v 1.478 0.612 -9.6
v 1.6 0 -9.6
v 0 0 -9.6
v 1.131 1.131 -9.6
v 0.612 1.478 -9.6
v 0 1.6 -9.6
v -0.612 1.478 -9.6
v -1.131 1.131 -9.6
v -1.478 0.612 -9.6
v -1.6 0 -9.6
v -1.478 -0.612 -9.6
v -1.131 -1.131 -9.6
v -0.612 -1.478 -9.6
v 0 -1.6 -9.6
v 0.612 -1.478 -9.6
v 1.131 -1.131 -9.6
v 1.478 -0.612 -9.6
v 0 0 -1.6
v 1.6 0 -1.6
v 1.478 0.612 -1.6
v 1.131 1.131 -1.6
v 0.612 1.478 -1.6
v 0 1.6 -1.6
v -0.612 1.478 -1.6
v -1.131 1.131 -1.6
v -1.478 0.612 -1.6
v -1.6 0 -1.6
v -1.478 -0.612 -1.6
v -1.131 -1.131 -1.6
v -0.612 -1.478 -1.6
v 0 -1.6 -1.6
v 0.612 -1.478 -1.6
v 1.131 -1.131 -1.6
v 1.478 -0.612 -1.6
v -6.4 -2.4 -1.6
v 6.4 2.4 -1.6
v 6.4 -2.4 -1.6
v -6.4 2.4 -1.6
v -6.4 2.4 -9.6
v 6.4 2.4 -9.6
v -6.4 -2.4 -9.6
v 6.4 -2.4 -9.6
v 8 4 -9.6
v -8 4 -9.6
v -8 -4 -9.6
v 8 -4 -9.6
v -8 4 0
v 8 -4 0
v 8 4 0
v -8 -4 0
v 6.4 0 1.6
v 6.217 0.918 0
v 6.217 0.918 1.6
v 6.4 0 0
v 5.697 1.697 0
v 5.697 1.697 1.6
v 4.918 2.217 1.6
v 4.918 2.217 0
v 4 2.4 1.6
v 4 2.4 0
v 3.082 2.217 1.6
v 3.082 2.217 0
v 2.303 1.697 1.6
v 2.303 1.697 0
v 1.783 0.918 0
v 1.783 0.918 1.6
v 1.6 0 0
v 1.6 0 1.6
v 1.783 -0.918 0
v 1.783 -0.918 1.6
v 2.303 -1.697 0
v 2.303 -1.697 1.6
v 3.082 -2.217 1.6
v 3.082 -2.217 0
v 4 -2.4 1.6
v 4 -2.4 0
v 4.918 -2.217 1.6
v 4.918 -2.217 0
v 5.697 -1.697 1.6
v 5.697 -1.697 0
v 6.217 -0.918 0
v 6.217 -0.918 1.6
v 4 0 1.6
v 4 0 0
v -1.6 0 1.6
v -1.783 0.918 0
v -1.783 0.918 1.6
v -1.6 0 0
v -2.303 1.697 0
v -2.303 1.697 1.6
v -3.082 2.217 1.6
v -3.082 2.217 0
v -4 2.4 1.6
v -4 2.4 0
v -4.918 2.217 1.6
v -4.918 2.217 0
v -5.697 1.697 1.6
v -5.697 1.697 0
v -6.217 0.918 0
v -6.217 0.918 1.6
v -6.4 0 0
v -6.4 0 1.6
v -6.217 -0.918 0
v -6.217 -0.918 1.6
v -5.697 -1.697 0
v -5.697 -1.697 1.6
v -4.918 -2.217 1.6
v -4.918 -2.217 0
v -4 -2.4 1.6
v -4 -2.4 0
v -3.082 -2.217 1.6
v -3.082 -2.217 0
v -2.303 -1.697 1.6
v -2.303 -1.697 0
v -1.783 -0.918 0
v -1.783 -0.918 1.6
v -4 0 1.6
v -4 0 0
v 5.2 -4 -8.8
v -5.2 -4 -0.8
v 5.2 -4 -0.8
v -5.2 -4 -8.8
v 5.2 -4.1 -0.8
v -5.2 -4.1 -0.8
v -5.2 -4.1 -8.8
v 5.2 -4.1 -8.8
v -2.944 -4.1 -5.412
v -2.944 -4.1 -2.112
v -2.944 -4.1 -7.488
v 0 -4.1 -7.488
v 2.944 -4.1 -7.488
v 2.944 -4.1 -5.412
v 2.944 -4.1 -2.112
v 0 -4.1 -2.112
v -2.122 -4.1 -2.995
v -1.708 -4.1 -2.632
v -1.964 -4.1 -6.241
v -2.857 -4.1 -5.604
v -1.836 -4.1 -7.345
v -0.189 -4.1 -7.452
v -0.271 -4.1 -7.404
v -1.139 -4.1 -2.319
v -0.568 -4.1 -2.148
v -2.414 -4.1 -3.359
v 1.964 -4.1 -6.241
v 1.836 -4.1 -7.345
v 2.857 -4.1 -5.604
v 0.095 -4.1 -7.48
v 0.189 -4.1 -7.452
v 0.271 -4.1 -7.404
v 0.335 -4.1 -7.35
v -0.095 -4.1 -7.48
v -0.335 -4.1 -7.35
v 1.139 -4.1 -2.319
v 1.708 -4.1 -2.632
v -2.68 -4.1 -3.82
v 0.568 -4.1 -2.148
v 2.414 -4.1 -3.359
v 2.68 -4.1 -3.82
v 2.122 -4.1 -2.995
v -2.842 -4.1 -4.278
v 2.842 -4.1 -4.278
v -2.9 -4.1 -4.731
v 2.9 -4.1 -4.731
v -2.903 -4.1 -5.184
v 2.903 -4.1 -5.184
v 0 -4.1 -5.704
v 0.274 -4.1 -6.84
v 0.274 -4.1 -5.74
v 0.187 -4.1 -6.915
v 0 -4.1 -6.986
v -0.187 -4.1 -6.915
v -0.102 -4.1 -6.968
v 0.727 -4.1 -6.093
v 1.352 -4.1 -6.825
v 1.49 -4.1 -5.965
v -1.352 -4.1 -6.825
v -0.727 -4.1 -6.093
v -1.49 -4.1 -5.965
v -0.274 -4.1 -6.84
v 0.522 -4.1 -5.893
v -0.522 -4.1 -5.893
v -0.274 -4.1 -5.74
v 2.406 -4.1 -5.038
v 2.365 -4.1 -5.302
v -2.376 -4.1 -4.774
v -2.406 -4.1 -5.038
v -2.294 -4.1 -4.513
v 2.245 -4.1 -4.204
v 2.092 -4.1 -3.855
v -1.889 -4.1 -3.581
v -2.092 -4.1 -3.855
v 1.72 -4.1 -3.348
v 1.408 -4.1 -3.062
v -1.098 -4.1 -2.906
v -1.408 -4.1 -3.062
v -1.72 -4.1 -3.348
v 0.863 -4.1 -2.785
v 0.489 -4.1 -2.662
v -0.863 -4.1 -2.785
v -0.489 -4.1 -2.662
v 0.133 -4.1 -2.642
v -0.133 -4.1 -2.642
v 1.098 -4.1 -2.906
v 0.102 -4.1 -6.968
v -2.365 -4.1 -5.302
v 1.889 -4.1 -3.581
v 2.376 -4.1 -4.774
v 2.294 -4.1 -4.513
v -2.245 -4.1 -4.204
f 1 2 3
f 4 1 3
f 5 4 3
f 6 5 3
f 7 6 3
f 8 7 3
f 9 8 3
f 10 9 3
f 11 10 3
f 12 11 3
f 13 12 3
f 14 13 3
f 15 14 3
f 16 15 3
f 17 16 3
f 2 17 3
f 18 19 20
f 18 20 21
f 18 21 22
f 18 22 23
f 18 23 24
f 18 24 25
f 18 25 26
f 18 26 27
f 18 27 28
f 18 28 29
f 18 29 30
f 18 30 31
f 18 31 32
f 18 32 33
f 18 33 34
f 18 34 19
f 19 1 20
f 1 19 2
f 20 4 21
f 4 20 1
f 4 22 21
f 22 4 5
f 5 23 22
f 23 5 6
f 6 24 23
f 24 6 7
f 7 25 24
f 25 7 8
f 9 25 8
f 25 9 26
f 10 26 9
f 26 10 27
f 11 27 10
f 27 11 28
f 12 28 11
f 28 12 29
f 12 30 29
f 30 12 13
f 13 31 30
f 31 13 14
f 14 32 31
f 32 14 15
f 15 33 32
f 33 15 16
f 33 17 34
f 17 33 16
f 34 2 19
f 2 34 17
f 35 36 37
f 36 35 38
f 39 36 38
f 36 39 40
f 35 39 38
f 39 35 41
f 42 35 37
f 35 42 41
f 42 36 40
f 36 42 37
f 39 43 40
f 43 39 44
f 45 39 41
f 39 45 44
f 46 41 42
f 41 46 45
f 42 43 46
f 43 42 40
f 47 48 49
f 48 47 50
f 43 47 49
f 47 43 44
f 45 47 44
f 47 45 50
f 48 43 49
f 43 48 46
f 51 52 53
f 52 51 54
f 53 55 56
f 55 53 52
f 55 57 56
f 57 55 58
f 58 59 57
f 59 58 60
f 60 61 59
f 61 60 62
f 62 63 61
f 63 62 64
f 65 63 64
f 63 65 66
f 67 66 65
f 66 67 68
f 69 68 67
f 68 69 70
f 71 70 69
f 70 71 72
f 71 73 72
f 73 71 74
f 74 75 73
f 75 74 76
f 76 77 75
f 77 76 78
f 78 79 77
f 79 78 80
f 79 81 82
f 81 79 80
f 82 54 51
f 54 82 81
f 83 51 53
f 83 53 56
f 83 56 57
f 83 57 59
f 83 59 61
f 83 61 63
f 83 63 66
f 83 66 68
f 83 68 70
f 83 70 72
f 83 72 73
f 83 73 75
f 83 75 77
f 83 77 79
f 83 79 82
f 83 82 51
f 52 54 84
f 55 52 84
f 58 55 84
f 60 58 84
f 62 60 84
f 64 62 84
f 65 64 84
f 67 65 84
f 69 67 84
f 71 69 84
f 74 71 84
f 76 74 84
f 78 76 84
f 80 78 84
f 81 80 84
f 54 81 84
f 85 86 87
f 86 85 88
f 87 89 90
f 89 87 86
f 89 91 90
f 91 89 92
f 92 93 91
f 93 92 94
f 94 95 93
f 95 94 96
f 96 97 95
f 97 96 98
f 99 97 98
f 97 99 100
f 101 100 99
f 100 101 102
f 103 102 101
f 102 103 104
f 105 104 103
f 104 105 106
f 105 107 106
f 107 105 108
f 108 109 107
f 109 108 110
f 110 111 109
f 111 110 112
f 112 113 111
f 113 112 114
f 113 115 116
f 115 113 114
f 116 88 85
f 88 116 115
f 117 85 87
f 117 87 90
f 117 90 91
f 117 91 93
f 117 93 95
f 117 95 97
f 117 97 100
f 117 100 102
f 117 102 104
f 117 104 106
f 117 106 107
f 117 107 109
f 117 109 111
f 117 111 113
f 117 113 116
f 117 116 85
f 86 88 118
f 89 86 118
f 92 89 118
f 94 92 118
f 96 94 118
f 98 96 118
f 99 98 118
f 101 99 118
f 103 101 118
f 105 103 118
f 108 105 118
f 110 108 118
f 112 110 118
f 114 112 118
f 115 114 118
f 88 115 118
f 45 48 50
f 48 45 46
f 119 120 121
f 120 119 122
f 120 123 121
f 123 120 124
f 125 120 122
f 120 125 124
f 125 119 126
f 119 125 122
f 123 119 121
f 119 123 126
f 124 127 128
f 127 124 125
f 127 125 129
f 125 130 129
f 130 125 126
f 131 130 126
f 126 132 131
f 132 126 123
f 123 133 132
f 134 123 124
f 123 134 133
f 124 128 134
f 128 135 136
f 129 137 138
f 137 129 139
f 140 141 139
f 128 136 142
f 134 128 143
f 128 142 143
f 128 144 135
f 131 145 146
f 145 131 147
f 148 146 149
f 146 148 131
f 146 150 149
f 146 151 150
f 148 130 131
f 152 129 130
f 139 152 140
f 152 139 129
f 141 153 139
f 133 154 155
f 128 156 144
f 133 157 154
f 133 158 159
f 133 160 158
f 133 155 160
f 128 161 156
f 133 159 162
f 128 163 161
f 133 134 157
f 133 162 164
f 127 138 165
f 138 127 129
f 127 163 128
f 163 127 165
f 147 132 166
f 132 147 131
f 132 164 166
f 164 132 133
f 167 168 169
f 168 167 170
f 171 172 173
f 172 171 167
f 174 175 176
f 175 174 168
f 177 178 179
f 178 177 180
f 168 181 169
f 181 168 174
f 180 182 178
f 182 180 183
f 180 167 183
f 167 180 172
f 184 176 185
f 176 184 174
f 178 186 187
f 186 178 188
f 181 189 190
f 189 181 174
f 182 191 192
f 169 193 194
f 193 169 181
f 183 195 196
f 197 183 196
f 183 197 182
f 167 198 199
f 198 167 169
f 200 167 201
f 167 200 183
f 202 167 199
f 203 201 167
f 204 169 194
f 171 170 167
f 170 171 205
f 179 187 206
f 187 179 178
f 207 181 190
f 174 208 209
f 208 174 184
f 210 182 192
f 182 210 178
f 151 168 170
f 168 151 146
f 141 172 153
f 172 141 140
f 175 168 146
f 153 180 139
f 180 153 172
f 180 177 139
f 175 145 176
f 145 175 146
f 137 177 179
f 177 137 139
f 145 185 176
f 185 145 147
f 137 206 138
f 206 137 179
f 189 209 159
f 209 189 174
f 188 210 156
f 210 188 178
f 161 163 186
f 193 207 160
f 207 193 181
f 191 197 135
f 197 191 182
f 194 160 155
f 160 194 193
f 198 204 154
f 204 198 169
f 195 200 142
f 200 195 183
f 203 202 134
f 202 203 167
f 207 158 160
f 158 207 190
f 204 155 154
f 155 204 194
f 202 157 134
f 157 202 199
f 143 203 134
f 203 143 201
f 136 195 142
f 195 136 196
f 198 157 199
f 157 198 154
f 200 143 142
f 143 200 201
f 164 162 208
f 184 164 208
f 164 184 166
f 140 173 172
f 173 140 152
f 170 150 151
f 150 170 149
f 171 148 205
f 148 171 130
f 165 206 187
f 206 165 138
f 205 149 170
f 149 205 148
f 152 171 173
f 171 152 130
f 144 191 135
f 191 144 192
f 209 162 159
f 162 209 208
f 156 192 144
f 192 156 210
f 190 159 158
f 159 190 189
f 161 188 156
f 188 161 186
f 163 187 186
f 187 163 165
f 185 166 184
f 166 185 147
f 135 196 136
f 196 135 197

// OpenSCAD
// file: ../p/4-4edge.scad
use <../lib.scad>
function ldraw_lib__4_4edge() = [
// 0 Circle 1.0
// 0 Name: 4-4edge.dat
// 0 Author: James Jessiman
// 0 !LDRAW_ORG Primitive UPDATE 2017-01
// 0 !LICENSE Licensed under CC BY 2.0 and CC BY 4.0 : see CAreadme.txt
// 
// 0 BFC CERTIFY CCW
  [0,"BFC","CERTIFY"],
  [0,"BFC","CCW"],
// 
// 0 !HISTORY 1998-12-15 [PTadmin] Official Update 1998-10
// 0 !HISTORY 2005-12-28 [PTadmin] Official Update 2005-01
// 0 !HISTORY 2007-06-24 [PTadmin] Header formatted for Contributor Agreement
// 0 !HISTORY 2008-07-01 [PTadmin] Official Update 2008-01
// 0 !HISTORY 2017-01-15 [Steffen] BFCed
// 0 !HISTORY 2017-12-30 [PTadmin] Official Update 2017-01
// 
// 
// 2 24 1 0 0 0.9239 0 0.3827
  [2,24,1,0,0,0.9239,0,0.3827],
// 2 24 0.9239 0 0.3827 0.7071 0 0.7071
  [2,24,0.9239,0,0.3827,0.7071,0,0.7071],
// 2 24 0.7071 0 0.7071 0.3827 0 0.9239
  [2,24,0.7071,0,0.7071,0.3827,0,0.9239],
// 2 24 0.3827 0 0.9239 0 0 1
  [2,24,0.3827,0,0.9239,0,0,1],
// 2 24 0 0 1 -0.3827 0 0.9239
  [2,24,0,0,1,-0.3827,0,0.9239],
// 2 24 -0.3827 0 0.9239 -0.7071 0 0.7071
  [2,24,-0.3827,0,0.9239,-0.7071,0,0.7071],
// 2 24 -0.7071 0 0.7071 -0.9239 0 0.3827
  [2,24,-0.7071,0,0.7071,-0.9239,0,0.3827],
// 2 24 -0.9239 0 0.3827 -1 0 -0
  [2,24,-0.9239,0,0.3827,-1,0,-0],
// 2 24 -1 0 -0 -0.9239 0 -0.3827
  [2,24,-1,0,-0,-0.9239,0,-0.3827],
// 2 24 -0.9239 0 -0.3827 -0.7071 0 -0.7071
  [2,24,-0.9239,0,-0.3827,-0.7071,0,-0.7071],
// 2 24 -0.7071 0 -0.7071 -0.3827 0 -0.9239
  [2,24,-0.7071,0,-0.7071,-0.3827,0,-0.9239],
// 2 24 -0.3827 0 -0.9239 0 0 -1
  [2,24,-0.3827,0,-0.9239,0,0,-1],
// 2 24 0 0 -1 0.3827 0 -0.9239
  [2,24,0,0,-1,0.3827,0,-0.9239],
// 2 24 0.3827 0 -0.9239 0.7071 0 -0.7071
  [2,24,0.3827,0,-0.9239,0.7071,0,-0.7071],
// 2 24 0.7071 0 -0.7071 0.9239 0 -0.3827
  [2,24,0.7071,0,-0.7071,0.9239,0,-0.3827],
// 2 24 0.9239 0 -0.3827 1 0 0
  [2,24,0.9239,0,-0.3827,1,0,0],
];
module ldraw_lib__4_4edge(step=0, col=false, unit=2/5, alt=false, line=0.2, solid=!$preview)
    makepoly(ldraw_lib__4_4edge(), step=step, col=col, unit=unit, alt=alt, line=line, solid=solid);
ldraw_lib__4_4edge(line=0.2);
// file: ../p/4-4disc.scad
use <../lib.scad>
function ldraw_lib__4_4disc() = [
// 0 Disc 1.0
// 0 Name: 4-4disc.dat
// 0 Author: James Jessiman
// 0 !LDRAW_ORG Primitive UPDATE 2002-02
// 0 !LICENSE Licensed under CC BY 2.0 and CC BY 4.0 : see CAreadme.txt
// 
// 0 BFC CERTIFY CCW
  [0,"BFC","CERTIFY"],
  [0,"BFC","CCW"],
// 
// 0 !HISTORY 1998-12-15 [PTadmin] Official Update 1998-10
// 0 !HISTORY 2002-03-23 [sbliss] Added BFC statement
// 0 !HISTORY 2002-04-25 [PTadmin] Official Update 2002-02
// 0 !HISTORY 2007-06-24 [PTadmin] Header formatted for Contributor Agreement
// 0 !HISTORY 2008-07-01 [PTadmin] Official Update 2008-01
// 
// 
// 3 16 0 0 0 1 0 0 0.9239 0 0.3827
  [3,16,0,0,0,1,0,0,0.9239,0,0.3827],
// 3 16 0 0 0 0.9239 0 0.3827 0.7071 0 0.7071
  [3,16,0,0,0,0.9239,0,0.3827,0.7071,0,0.7071],
// 3 16 0 0 0 0.7071 0 0.7071 0.3827 0 0.9239
  [3,16,0,0,0,0.7071,0,0.7071,0.3827,0,0.9239],
// 3 16 0 0 0 0.3827 0 0.9239 0 0 1
  [3,16,0,0,0,0.3827,0,0.9239,0,0,1],
// 3 16 0 0 0 0 0 1 -0.3827 0 0.9239
  [3,16,0,0,0,0,0,1,-0.3827,0,0.9239],
// 3 16 0 0 0 -0.3827 0 0.9239 -0.7071 0 0.7071
  [3,16,0,0,0,-0.3827,0,0.9239,-0.7071,0,0.7071],
// 3 16 0 0 0 -0.7071 0 0.7071 -0.9239 0 0.3827
  [3,16,0,0,0,-0.7071,0,0.7071,-0.9239,0,0.3827],
// 3 16 0 0 0 -0.9239 0 0.3827 -1 0 -0
  [3,16,0,0,0,-0.9239,0,0.3827,-1,0,-0],
// 3 16 0 0 0 -1 0 -0 -0.9239 0 -0.3827
  [3,16,0,0,0,-1,0,-0,-0.9239,0,-0.3827],
// 3 16 0 0 0 -0.9239 0 -0.3827 -0.7071 0 -0.7071
  [3,16,0,0,0,-0.9239,0,-0.3827,-0.7071,0,-0.7071],
// 3 16 0 0 0 -0.7071 0 -0.7071 -0.3827 0 -0.9239
  [3,16,0,0,0,-0.7071,0,-0.7071,-0.3827,0,-0.9239],
// 3 16 0 0 0 -0.3827 0 -0.9239 0 0 -1
  [3,16,0,0,0,-0.3827,0,-0.9239,0,0,-1],
// 3 16 0 0 0 0 0 -1 0.3827 0 -0.9239
  [3,16,0,0,0,0,0,-1,0.3827,0,-0.9239],
// 3 16 0 0 0 0.3827 0 -0.9239 0.7071 0 -0.7071
  [3,16,0,0,0,0.3827,0,-0.9239,0.7071,0,-0.7071],
// 3 16 0 0 0 0.7071 0 -0.7071 0.9239 0 -0.3827
  [3,16,0,0,0,0.7071,0,-0.7071,0.9239,0,-0.3827],
// 3 16 0 0 0 0.9239 0 -0.3827 1 0 0
  [3,16,0,0,0,0.9239,0,-0.3827,1,0,0],
// 0
];
module ldraw_lib__4_4disc(step=0, col=false, unit=2/5, alt=false, line=0.2, solid=!$preview)
    makepoly(ldraw_lib__4_4disc(), step=step, col=col, unit=unit, alt=alt, line=line, solid=solid);
ldraw_lib__4_4disc(line=0.2);
// file: ../p/4-4cyli.scad
use <../lib.scad>
$fa=1; $fs=0.2;
function ldraw_lib__4_4cyli(realsolid=false) = [
// 0 Cylinder 1.0
// 0 Name: 4-4cyli.dat
// 0 Author: James Jessiman
// 0 !LDRAW_ORG Primitive UPDATE 2005-01
// 0 !LICENSE Licensed under CC BY 2.0 and CC BY 4.0 : see CAreadme.txt
// 
// 0 BFC CERTIFY CCW
  [0,"BFC","CERTIFY"],
  [0,"BFC","CCW"],
// 
// 0 !HISTORY 1998-12-15 [PTadmin] Official Update 1998-10
// 0 !HISTORY 2002-03-23 [sbliss] Added BFC statement; merged headers from files in distributions LDraw 0.27 and Complete.
// 0 !HISTORY 2002-04-25 [PTadmin] Official Update 2002-02
// 0 !HISTORY 2004-12-14 [guyvivan] BFC CCW
// 0 !HISTORY 2005-12-28 [PTadmin] Official Update 2005-01
// 0 !HISTORY 2007-06-24 [PTadmin] Header formatted for Contributor Agreement
// 0 !HISTORY 2008-07-01 [PTadmin] Official Update 2008-01
// 
// 
// 4 16 1 1 0 0.9239 1 0.3827 0.9239 0 0.3827 1 0 0
  [4,16,1,1,0,0.9239,1,0.3827,0.9239,0,0.3827,1,0,0],
// 5 24 1 0 0 1 1 0 0.9239 0 0.3827 0.9239 0 -0.3827
  [5,24,1,0,0,1,1,0,0.9239,0,0.3827,0.9239,0,-0.3827],
// 4 16 0.9239 1 0.3827 0.7071 1 0.7071 0.7071 0 0.7071 0.9239 0 0.3827
  [4,16,0.9239,1,0.3827,0.7071,1,0.7071,0.7071,0,0.7071,0.9239,0,0.3827],
// 5 24 0.9239 0 0.3827 0.9239 1 0.3827 0.7071 0 0.7071 1 0 0
  [5,24,0.9239,0,0.3827,0.9239,1,0.3827,0.7071,0,0.7071,1,0,0],
// 4 16 0.7071 1 0.7071 0.3827 1 0.9239 0.3827 0 0.9239 0.7071 0 0.7071
  [4,16,0.7071,1,0.7071,0.3827,1,0.9239,0.3827,0,0.9239,0.7071,0,0.7071],
// 5 24 0.7071 0 0.7071 0.7071 1 0.7071 0.3827 0 0.9239 0.9239 0 0.3827
  [5,24,0.7071,0,0.7071,0.7071,1,0.7071,0.3827,0,0.9239,0.9239,0,0.3827],
// 4 16 0.3827 1 0.9239 0 1 1 0 0 1 0.3827 0 0.9239
  [4,16,0.3827,1,0.9239,0,1,1,0,0,1,0.3827,0,0.9239],
// 5 24 0.3827 0 0.9239 0.3827 1 0.9239 0 0 1 0.7071 0 0.7071
  [5,24,0.3827,0,0.9239,0.3827,1,0.9239,0,0,1,0.7071,0,0.7071],
// 4 16 0 1 1 -0.3827 1 0.9239 -0.3827 0 0.9239 0 0 1
  [4,16,0,1,1,-0.3827,1,0.9239,-0.3827,0,0.9239,0,0,1],
// 5 24 0 0 1 0 1 1 -0.3827 0 0.9239 0.3827 0 0.9239
  [5,24,0,0,1,0,1,1,-0.3827,0,0.9239,0.3827,0,0.9239],
// 4 16 -0.3827 1 0.9239 -0.7071 1 0.7071 -0.7071 0 0.7071 -0.3827 0 0.9239
  [4,16,-0.3827,1,0.9239,-0.7071,1,0.7071,-0.7071,0,0.7071,-0.3827,0,0.9239],
// 5 24 -0.3827 0 0.9239 -0.3827 1 0.9239 -0.7071 0 0.7071 0 0 1
  [5,24,-0.3827,0,0.9239,-0.3827,1,0.9239,-0.7071,0,0.7071,0,0,1],
// 4 16 -0.7071 1 0.7071 -0.9239 1 0.3827 -0.9239 0 0.3827 -0.7071 0 0.7071
  [4,16,-0.7071,1,0.7071,-0.9239,1,0.3827,-0.9239,0,0.3827,-0.7071,0,0.7071],
// 5 24 -0.7071 0 0.7071 -0.7071 1 0.7071 -0.9239 0 0.3827 -0.3827 0 0.9239
  [5,24,-0.7071,0,0.7071,-0.7071,1,0.7071,-0.9239,0,0.3827,-0.3827,0,0.9239],
// 4 16 -0.9239 1 0.3827 -1 1 0 -1 0 0 -0.9239 0 0.3827
  [4,16,-0.9239,1,0.3827,-1,1,0,-1,0,0,-0.9239,0,0.3827],
// 5 24 -0.9239 0 0.3827 -0.9239 1 0.3827 -1 0 0 -0.7071 0 0.7071
  [5,24,-0.9239,0,0.3827,-0.9239,1,0.3827,-1,0,0,-0.7071,0,0.7071],
// 4 16 -1 1 0 -0.9239 1 -0.3827 -0.9239 0 -0.3827 -1 0 0
  [4,16,-1,1,0,-0.9239,1,-0.3827,-0.9239,0,-0.3827,-1,0,0],
// 5 24 -1 0 0 -1 1 0 -0.9239 0 -0.3827 -0.9239 0 0.3827
  [5,24,-1,0,0,-1,1,0,-0.9239,0,-0.3827,-0.9239,0,0.3827],
// 4 16 -0.9239 1 -0.3827 -0.7071 1 -0.7071 -0.7071 0 -0.7071 -0.9239 0 -0.3827
  [4,16,-0.9239,1,-0.3827,-0.7071,1,-0.7071,-0.7071,0,-0.7071,-0.9239,0,-0.3827],
// 5 24 -0.9239 0 -0.3827 -0.9239 1 -0.3827 -0.7071 0 -0.7071 -1 0 0
  [5,24,-0.9239,0,-0.3827,-0.9239,1,-0.3827,-0.7071,0,-0.7071,-1,0,0],
// 4 16 -0.7071 1 -0.7071 -0.3827 1 -0.9239 -0.3827 0 -0.9239 -0.7071 0 -0.7071
  [4,16,-0.7071,1,-0.7071,-0.3827,1,-0.9239,-0.3827,0,-0.9239,-0.7071,0,-0.7071],
// 5 24 -0.7071 0 -0.7071 -0.7071 1 -0.7071 -0.3827 0 -0.9239 -0.9239 0 -0.3827
  [5,24,-0.7071,0,-0.7071,-0.7071,1,-0.7071,-0.3827,0,-0.9239,-0.9239,0,-0.3827],
// 4 16 -0.3827 1 -0.9239 0 1 -1 0 0 -1 -0.3827 0 -0.9239
  [4,16,-0.3827,1,-0.9239,0,1,-1,0,0,-1,-0.3827,0,-0.9239],
// 5 24 -0.3827 0 -0.9239 -0.3827 1 -0.9239 0 0 -1 -0.7071 0 -0.7071
  [5,24,-0.3827,0,-0.9239,-0.3827,1,-0.9239,0,0,-1,-0.7071,0,-0.7071],
// 4 16 0 1 -1 0.3827 1 -0.9239 0.3827 0 -0.9239 0 0 -1
  [4,16,0,1,-1,0.3827,1,-0.9239,0.3827,0,-0.9239,0,0,-1],
// 5 24 0 0 -1 0 1 -1 0.3827 0 -0.9239 -0.3827 0 -0.9239
  [5,24,0,0,-1,0,1,-1,0.3827,0,-0.9239,-0.3827,0,-0.9239],
// 4 16 0.3827 1 -0.9239 0.7071 1 -0.7071 0.7071 0 -0.7071 0.3827 0 -0.9239
  [4,16,0.3827,1,-0.9239,0.7071,1,-0.7071,0.7071,0,-0.7071,0.3827,0,-0.9239],
// 5 24 0.3827 0 -0.9239 0.3827 1 -0.9239 0.7071 0 -0.7071 0 0 -1
  [5,24,0.3827,0,-0.9239,0.3827,1,-0.9239,0.7071,0,-0.7071,0,0,-1],
// 4 16 0.7071 1 -0.7071 0.9239 1 -0.3827 0.9239 0 -0.3827 0.7071 0 -0.7071
  [4,16,0.7071,1,-0.7071,0.9239,1,-0.3827,0.9239,0,-0.3827,0.7071,0,-0.7071],
// 5 24 0.7071 0 -0.7071 0.7071 1 -0.7071 0.9239 0 -0.3827 0.3827 0 -0.9239
  [5,24,0.7071,0,-0.7071,0.7071,1,-0.7071,0.9239,0,-0.3827,0.3827,0,-0.9239],
// 4 16 0.9239 1 -0.3827 1 1 0 1 0 0 0.9239 0 -0.3827
  [4,16,0.9239,1,-0.3827,1,1,0,1,0,0,0.9239,0,-0.3827],
// 5 24 0.9239 0 -0.3827 0.9239 1 -0.3827 1 0 0 0.7071 0 -0.7071
  [5,24,0.9239,0,-0.3827,0.9239,1,-0.3827,1,0,0,0.7071,0,-0.7071],
// 0
];
module ldraw_lib__4_4cyli(step=0, col=false, unit=2/5, alt=false, line=0.2, solid=!$preview)
    makepoly(ldraw_lib__4_4cyli(solid), step=step, col=col, unit=unit, alt=alt, line=line, solid=solid);
ldraw_lib__4_4cyli(line=0.2);
// file: ../p/stud3.scad
use <../lib.scad>
use <4-4cyli.scad>
use <4-4disc.scad>
use <4-4edge.scad>
function ldraw_lib__stud3() = [
// 0 Stud Tube Solid
// 0 Name: stud3.dat
// 0 Author: James Jessiman
// 0 !LDRAW_ORG Primitive UPDATE 2012-01
// 0 !LICENSE Licensed under CC BY 4.0 : see CAreadme.txt
// 
// 0 BFC CERTIFY CCW
  [0,"BFC","CERTIFY"],
  [0,"BFC","CCW"],
// 
// 0 !HISTORY 2002-04-04 [sbliss] Modified for BFC compliance
// 0 !HISTORY 2002-04-25 [PTadmin] Official Update 2002-02
// 0 !HISTORY 2007-06-24 [PTadmin] Header formatted for Contributor Agreement
// 0 !HISTORY 2008-07-01 [PTadmin] Official Update 2008-01
// 0 !HISTORY 2012-02-16 [Philo] Changed to CCW
// 0 !HISTORY 2012-03-30 [PTadmin] Official Update 2012-01
// 
// 
// 1 16 0 -4 0 4 0 0 0 1 0 0 0 4 4-4edge.dat
  [1,16,0,-4,0,4,0,0,0,1,0,0,0,4, ldraw_lib__4_4edge()],
// 1 16 0 0 0 4 0 0 0 1 0 0 0 4 4-4edge.dat
  [1,16,0,0,0,4,0,0,0,1,0,0,0,4, ldraw_lib__4_4edge()],
// 1 16 0 -4 0 4 0 0 0 1 0 0 0 4 4-4disc.dat
  [1,16,0,-4,0,4,0,0,0,1,0,0,0,4, ldraw_lib__4_4disc()],
  [-1,16,0,0,0,4,0,0,0,-1,0,0,0,4, ldraw_lib__4_4disc()],
// 1 16 0 -4 0 4 0 0 0 4 0 0 0 4 4-4cyli.dat
  [1,16,0,-4,0,4,0,0,0,4,0,0,0,4, ldraw_lib__4_4cyli()],
];
module ldraw_lib__stud3(step=0, col=false, unit=2/5, alt=false, line=0.2, solid=!$preview)
    makepoly(ldraw_lib__stud3(), step=step, col=col, unit=unit, alt=alt, line=line, solid=solid);
ldraw_lib__stud3(line=0.2);
// file: ../p/stud.scad
use <../lib.scad>
use <4-4cyli.scad>
use <4-4disc.scad>
use <4-4edge.scad>
function ldraw_lib__stud() = [
// 0 Stud
// 0 Name: stud.dat
// 0 Author: James Jessiman
// 0 !LDRAW_ORG Primitive UPDATE 2012-01
// 0 !LICENSE Licensed under CC BY 4.0 : see CAreadme.txt
// 
// 0 BFC CERTIFY CCW
  [0,"BFC","CERTIFY"],
  [0,"BFC","CCW"],
// 
// 0 !HISTORY 2002-04-04 [sbliss] Modified for BFC compliance
// 0 !HISTORY 2002-04-25 [PTadmin] Official Update 2002-02
// 0 !HISTORY 2007-06-24 [PTadmin] Header formatted for Contributor Agreement
// 0 !HISTORY 2008-07-01 [PTadmin] Official Update 2008-01
// 0 !HISTORY 2012-02-16 [Philo] Changed to CCW
// 0 !HISTORY 2012-03-30 [PTadmin] Official Update 2012-01
// 
// 
// 1 16 0 0 0 6 0 0 0 1 0 0 0 6 4-4edge.dat
  [1,16,0,0,0,6,0,0,0,1,0,0,0,6, ldraw_lib__4_4edge()],
// 1 16 0 -4 0 6 0 0 0 1 0 0 0 6 4-4edge.dat
  [1,16,0,-4,0,6,0,0,0,1,0,0,0,6, ldraw_lib__4_4edge()],
// 1 16 0 0 0 6 0 0 0 -4 0 0 0 6 4-4cyli.dat
  [1,16,0,0,0,6,0,0,0,-4,0,0,0,6, ldraw_lib__4_4cyli()],
// 1 16 0 -4 0 6 0 0 0 1 0 0 0 6 4-4disc.dat
  [1,16,0,-4,0,6,0,0,0,1,0,0,0,6, ldraw_lib__4_4disc()],
  [-1,16,0,0,0,6,0,0,0,-1,0,0,0,6, ldraw_lib__4_4disc()],
];
module ldraw_lib__stud(step=0, col=false, unit=2/5, alt=false, line=0.2, solid=!$preview)
    makepoly(ldraw_lib__stud(), step=step, col=col, unit=unit, alt=alt, line=line, solid=solid);
ldraw_lib__stud(line=0.2);
// file: ../p/box5.scad
use <../lib.scad>
function ldraw_lib__box5() = [
// 0 Box with 5 Faces and All Edges
// 0 Name: box5.dat
// 0 Author: James Jessiman
// 0 !LDRAW_ORG Primitive UPDATE 2012-01
// 0 !LICENSE Licensed under CC BY 2.0 and CC BY 4.0 : see CAreadme.txt
// 
// 0 BFC CERTIFY CCW
  [0,"BFC","CERTIFY"],
  [0,"BFC","CCW"],
// 
// 0 !HISTORY 2002-04-03 [sbliss] Modified for BFC compliance
// 0 !HISTORY 2002-04-25 [PTadmin] Official Update 2002-02
// 0 !HISTORY 2007-06-24 [PTadmin] Header formatted for Contributor Agreement
// 0 !HISTORY 2008-07-01 [PTadmin] Official Update 2008-01
// 0 !HISTORY 2012-02-16 [Philo] Changed to CCW
// 0 !HISTORY 2012-03-30 [PTadmin] Official Update 2012-01
// 
// 
// 2 24 1 1 1 -1 1 1
  [2,24,1,1,1,-1,1,1],
// 2 24 -1 1 1 -1 1 -1
  [2,24,-1,1,1,-1,1,-1],
// 2 24 -1 1 -1 1 1 -1
  [2,24,-1,1,-1,1,1,-1],
// 2 24 1 1 -1 1 1 1
  [2,24,1,1,-1,1,1,1],
// 2 24 1 0 1 -1 0 1
  [2,24,1,0,1,-1,0,1],
// 2 24 -1 0 1 -1 0 -1
  [2,24,-1,0,1,-1,0,-1],
// 2 24 -1 0 -1 1 0 -1
  [2,24,-1,0,-1,1,0,-1],
// 2 24 1 0 -1 1 0 1
  [2,24,1,0,-1,1,0,1],
// 2 24 1 0 1 1 1 1
  [2,24,1,0,1,1,1,1],
// 2 24 -1 0 1 -1 1 1
  [2,24,-1,0,1,-1,1,1],
// 2 24 1 0 -1 1 1 -1
  [2,24,1,0,-1,1,1,-1],
// 2 24 -1 0 -1 -1 1 -1
  [2,24,-1,0,-1,-1,1,-1],
// 4 16 -1 1 1 1 1 1 1 1 -1 -1 1 -1
  [4,16,-1,1,1,1,1,1,1,1,-1,-1,1,-1],
// 4 16 -1 1 1 -1 0 1 1 0 1 1 1 1
  [4,16,-1,1,1,-1,0,1,1,0,1,1,1,1],
// 4 16 -1 1 -1 -1 0 -1 -1 0 1 -1 1 1
  [4,16,-1,1,-1,-1,0,-1,-1,0,1,-1,1,1],
// 4 16 1 1 -1 1 0 -1 -1 0 -1 -1 1 -1
  [4,16,1,1,-1,1,0,-1,-1,0,-1,-1,1,-1],
// 4 16 1 1 1 1 0 1 1 0 -1 1 1 -1
  [4,16,1,1,1,1,0,1,1,0,-1,1,1,-1],
];
makepoly(ldraw_lib__box5(), line=0.2);
// file: ../p/box4t.scad
use <../lib.scad>
function ldraw_lib__box4t() = [
// 0 Box with 4 Adjacent Faces and All Edges
// 0 Name: box4t.dat
// 0 Author: Tore Eriksson [Tore_Eriksson]
// 0 !LDRAW_ORG Primitive UPDATE 2003-02
// 0 !LICENSE Licensed under CC BY 2.0 and CC BY 4.0 : see CAreadme.txt
// 
// 0 BFC CERTIFY CCW
  [0,"BFC","CERTIFY"],
  [0,"BFC","CCW"],
// 
// 0 !HISTORY 1997-09-29 [PTadmin] Official Update 1997-15
// 0 !HISTORY 2002-08-31 [izanette] Modified with WINDZ for BFC compliance
// 0 !HISTORY 2003-08-01 [PTadmin] Official Update 2003-02
// 0 !HISTORY 2007-06-24 [PTadmin] Header formatted for Contributor Agreement
// 0 !HISTORY 2008-07-01 [PTadmin] Official Update 2008-01
// 
// 
// 2 24 1 1 1 -1 1 1
  [2,24,1,1,1,-1,1,1],
// 2 24 -1 1 1 -1 1 -1
  [2,24,-1,1,1,-1,1,-1],
// 2 24 -1 1 -1 1 1 -1
  [2,24,-1,1,-1,1,1,-1],
// 2 24 1 1 -1 1 1 1
  [2,24,1,1,-1,1,1,1],
// 2 24 1 0 1 -1 0 1
  [2,24,1,0,1,-1,0,1],
// 2 24 -1 0 1 -1 0 -1
  [2,24,-1,0,1,-1,0,-1],
// 2 24 -1 0 -1 1 0 -1
  [2,24,-1,0,-1,1,0,-1],
// 2 24 1 0 -1 1 0 1
  [2,24,1,0,-1,1,0,1],
// 2 24 1 0 1 1 1 1
  [2,24,1,0,1,1,1,1],
// 2 24 -1 0 1 -1 1 1
  [2,24,-1,0,1,-1,1,1],
// 2 24 1 0 -1 1 1 -1
  [2,24,1,0,-1,1,1,-1],
// 2 24 -1 0 -1 -1 1 -1
  [2,24,-1,0,-1,-1,1,-1],
// 4 16 1 1 1 1 1 -1 -1 1 -1 -1 1 1
  [4,16,1,1,1,1,1,-1,-1,1,-1,-1,1,1],
// 4 16 1 1 1 -1 1 1 -1 0 1 1 0 1
  [4,16,1,1,1,-1,1,1,-1,0,1,1,0,1],
// 4 16 -1 1 1 -1 1 -1 -1 0 -1 -1 0 1
  [4,16,-1,1,1,-1,1,-1,-1,0,-1,-1,0,1],
// 0 4 16 -1 1 -1 -1 0 -1 1 0 -1 1 1 -1
// 4 16 1 1 -1 1 1 1 1 0 1 1 0 -1
  [4,16,1,1,-1,1,1,1,1,0,1,1,0,-1],
// 0
];
makepoly(ldraw_lib__box4t(), line=0.2);
// file: s/3004s01.scad
use <../../lib.scad>
use <../../p/box4t.scad>
use <../../p/box5.scad>
use <../../p/stud.scad>
use <../../p/stud3.scad>
$fa=1; $fs=0.2;
function ldraw_lib__s__3004s01(realsolid=false) = [
// 0 ~Brick  1 x  2 without Front Face
// 0 Name: s\3004s01.dat
// 0 Author: James Jessiman
// 0 !LDRAW_ORG Subpart UPDATE 2003-03
// 0 !LICENSE Licensed under CC BY 2.0 and CC BY 4.0 : see CAreadme.txt
// 
// 0 BFC CERTIFY CCW
  [0,"BFC","CERTIFY"],
  [0,"BFC","CCW"],
// 
// 0 !HISTORY 2003-09-07 [jriley] Subfiling, BFC
// 0 !HISTORY 2003-12-19 [PTadmin] Official Update 2003-03
// 0 !HISTORY 2007-08-29 [PTadmin] Header formatted for Contributor Agreement
// 0 !HISTORY 2008-07-01 [PTadmin] Official Update 2008-01
// 
// 
// 1 16 0 4 0 1 0 0 0 -5 0 0 0 1 stud3.dat
  [1,16,0,4,0,1,0,0,0,-5,0,0,0,1, ldraw_lib__stud3(realsolid)],
// 0 BFC INVERTNEXT
  [0,"BFC","INVERTNEXT"],
// 1 16 0 24 0 16 0 0 0 -20 0 0 0 6 box5.dat
  [1,16,0,24,0,16,0,0,0,-20,0,0,0,6, ldraw_lib__box5(realsolid)],
// 4 16 20 24 10 16 24 6 -16 24 6 -20 24 10
  [4,16,20,24,10,16,24,6,-16,24,6,-20,24,10],
// 4 16 -20 24 10 -16 24 6 -16 24 -6 -20 24 -10
  [4,16,-20,24,10,-16,24,6,-16,24,-6,-20,24,-10],
// 4 16 -20 24 -10 -16 24 -6 16 24 -6 20 24 -10
  [4,16,-20,24,-10,-16,24,-6,16,24,-6,20,24,-10],
// 4 16 20 24 -10 16 24 -6 16 24 6 20 24 10
  [4,16,20,24,-10,16,24,-6,16,24,6,20,24,10],
// 1 16 0 24 0 20 0 0 0 -24 0 0 0 10 box4t.dat
  [1,16,0,24,0,20,0,0,0,-24,0,0,0,10, ldraw_lib__box4t(realsolid)],
// 1 16 10 0 0 1 0 0 0 1 0 0 0 1 stud.dat
  [1,16,10,0,0,1,0,0,0,1,0,0,0,1, ldraw_lib__stud(realsolid)],
// 1 16 -10 0 0 1 0 0 0 1 0 0 0 1 stud.dat
  [1,16,-10,0,0,1,0,0,0,1,0,0,0,1, ldraw_lib__stud(realsolid)],
// 0
];
module ldraw_lib__s__3004s01(step=0, col=false, unit=2/5, alt=false, line=0.2, solid=!$preview)
    makepoly(ldraw_lib__s__3004s01(solid), step=step, col=col, unit=unit, alt=alt, line=line, solid=solid);
ldraw_lib__s__3004s01(line=0.2);
// file: ../p/logo-shell-1971-outerbox.scad
use <../lib.scad>
function ldraw_lib__logo_shell_1971_outerbox() = [
// 0 Logo Shell 1971 Outerbox
// 0 Name: logo-shell-1971-outerbox.dat
// 0 Author: Vincent Messenet [Cheenzo]
// 0 !LDRAW_ORG Primitive UPDATE 2023-04
// 0 !LICENSE Licensed under CC BY 4.0 : see CAreadme.txt
// 
// 0 BFC CERTIFY CCW
  [0,"BFC","CERTIFY"],
  [0,"BFC","CCW"],
// 
// 0 !HISTORY 2023-06-28 [Cheenzo] Created based on 3004s60 by J. C. Tchang [tchang]
// 0 !HISTORY 2023-08-25 [OrionP] Official Update 2023-04
// 
// 
// 0 // Shell Logo 1971
// 0 // Size: x = -11.5 to 11.5 y = -10.5 to 10.5 z = 0
// 
// 3 16 -11.5 0 10.5 -8.29 0 7.05 -6.67 0 8.47
  [3,16,-11.5,0,10.5,-8.29,0,7.05,-6.67,0,8.47],
// 4 16 -7.17 0 -9.94 -7.67 0 -5.63 -11.16 0 -3.14 -11.5 0 -10.5
  [4,16,-7.17,0,-9.94,-7.67,0,-5.63,-11.16,0,-3.14,-11.5,0,-10.5],
// 3 16 -.74 0 -10.36 -1.06 0 -10.17 -7.17 0 -9.94
  [3,16,-.74,0,-10.36,-1.06,0,-10.17,-7.17,0,-9.94],
// 3 16 -11.5 0 10.5 -6.67 0 8.47 -4.45 0 9.69
  [3,16,-11.5,0,10.5,-6.67,0,8.47,-4.45,0,9.69],
// 3 16 0 0 10.5 -11.5 0 10.5 -2.22 0 10.36
  [3,16,0,0,10.5,-11.5,0,10.5,-2.22,0,10.36],
// 3 16 -11.5 0 10.5 -4.45 0 9.69 -2.22 0 10.36
  [3,16,-11.5,0,10.5,-4.45,0,9.69,-2.22,0,10.36],
// 3 16 -11.5 0 10.5 -9.43 0 5.63 -8.29 0 7.05
  [3,16,-11.5,0,10.5,-9.43,0,5.63,-8.29,0,7.05],
// 4 16 11.16 0 -3.14 7.67 0 -5.63 7.17 0 -9.94 11.5 0 -10.5
  [4,16,11.16,0,-3.14,7.67,0,-5.63,7.17,0,-9.94,11.5,0,-10.5],
// 4 16 11.5 0 -10.5 7.17 0 -9.94 .74 0 -10.36 .37 0 -10.47
  [4,16,11.5,0,-10.5,7.17,0,-9.94,.74,0,-10.36,.37,0,-10.47],
// 3 16 7.17 0 -9.94 1.06 0 -10.17 .74 0 -10.36
  [3,16,7.17,0,-9.94,1.06,0,-10.17,.74,0,-10.36],
// 3 16 7.17 0 -9.94 1.31 0 -9.96 1.06 0 -10.17
  [3,16,7.17,0,-9.94,1.31,0,-9.96,1.06,0,-10.17],
// 3 16 .37 0 -10.47 0 0 -10.5 11.5 0 -10.5
  [3,16,.37,0,-10.47,0,0,-10.5,11.5,0,-10.5],
// 3 16 -.37 0 -10.47 -11.5 0 -10.5 0 0 -10.5
  [3,16,-.37,0,-10.47,-11.5,0,-10.5,0,0,-10.5],
// 4 16 -.37 0 -10.47 -.74 0 -10.36 -7.17 0 -9.94 -11.5 0 -10.5
  [4,16,-.37,0,-10.47,-.74,0,-10.36,-7.17,0,-9.94,-11.5,0,-10.5],
// 3 16 -1.06 0 -10.17 -1.31 0 -9.96 -7.17 0 -9.94
  [3,16,-1.06,0,-10.17,-1.31,0,-9.96,-7.17,0,-9.94],
// 3 16 11.5 0 10.5 4.45 0 9.69 6.67 0 8.47
  [3,16,11.5,0,10.5,4.45,0,9.69,6.67,0,8.47],
// 3 16 -11.5 0 10.5 -10.47 0 3.83 -9.43 0 5.63
  [3,16,-11.5,0,10.5,-10.47,0,3.83,-9.43,0,5.63],
// 3 16 11.5 0 10.5 2.22 0 10.36 4.45 0 9.69
  [3,16,11.5,0,10.5,2.22,0,10.36,4.45,0,9.69],
// 3 16 11.5 0 10.5 9.43 0 5.63 10.47 0 3.83
  [3,16,11.5,0,10.5,9.43,0,5.63,10.47,0,3.83],
// 3 16 11.5 0 10.5 8.29 0 7.05 9.43 0 5.63
  [3,16,11.5,0,10.5,8.29,0,7.05,9.43,0,5.63],
// 3 16 11.5 0 10.5 6.67 0 8.47 8.29 0 7.05
  [3,16,11.5,0,10.5,6.67,0,8.47,8.29,0,7.05],
// 3 16 -11.5 0 10.5 -11.1 0 2.04 -10.47 0 3.83
  [3,16,-11.5,0,10.5,-11.1,0,2.04,-10.47,0,3.83],
// 3 16 11.5 0 10.5 10.47 0 3.83 11.1 0 2.04
  [3,16,11.5,0,10.5,10.47,0,3.83,11.1,0,2.04],
// 3 16 -11.5 0 10.5 -11.33 0 .27 -11.1 0 2.04
  [3,16,-11.5,0,10.5,-11.33,0,.27,-11.1,0,2.04],
// 3 16 11.5 0 10.5 0 0 10.5 2.22 0 10.36
  [3,16,11.5,0,10.5,0,0,10.5,2.22,0,10.36],
// 3 16 11.5 0 10.5 11.1 0 2.04 11.33 0 .27
  [3,16,11.5,0,10.5,11.1,0,2.04,11.33,0,.27],
// 4 16 -11.16 0 -3.14 -11.34 0 -1.5 -11.5 0 -2.39 -11.5 0 -10.5
  [4,16,-11.16,0,-3.14,-11.34,0,-1.5,-11.5,0,-2.39,-11.5,0,-10.5],
// 4 16 -11.34 0 -1.5 -11.33 0 .27 -11.5 0 10.5 -11.5 0 -2.39
  [4,16,-11.34,0,-1.5,-11.33,0,.27,-11.5,0,10.5,-11.5,0,-2.39],
// 4 16 11.5 0 -2.39 11.34 0 -1.5 11.16 0 -3.14 11.5 0 -10.5
  [4,16,11.5,0,-2.39,11.34,0,-1.5,11.16,0,-3.14,11.5,0,-10.5],
// 4 16 11.5 0 -2.39 11.5 0 10.5 11.33 0 .27 11.34 0 -1.5
  [4,16,11.5,0,-2.39,11.5,0,10.5,11.33,0,.27,11.34,0,-1.5],
];
module ldraw_lib__logo_shell_1971_outerbox(step=0, col=false, unit=2/5, alt=false, line=0.2, solid=!$preview)
    makepoly(ldraw_lib__logo_shell_1971_outerbox(), step=step, col=col, unit=unit, alt=alt, line=line, solid=solid);
ldraw_lib__logo_shell_1971_outerbox(line=0.2);
// file: ../p/box5-12.scad
use <../lib.scad>
function ldraw_lib__box5_12() = [
// 0 Box with 5 Faces without Any Edges
// 0 Name: box5-12.dat
// 0 Author: Chris Dee [cwdee]
// 0 !LDRAW_ORG Primitive UPDATE 2009-02
// 0 !LICENSE Licensed under CC BY 2.0 and CC BY 4.0 : see CAreadme.txt
// 
// 0 BFC CERTIFY CCW
  [0,"BFC","CERTIFY"],
  [0,"BFC","CCW"],
// 
// 0 !HISTORY 2009-09-03 [PTadmin] Official Update 2009-02
// 
// 
// 4 16 1 1 1 1 1 -1 -1 1 -1 -1 1 1
  [4,16,1,1,1,1,1,-1,-1,1,-1,-1,1,1],
// 4 16 -1 0 1 1 0 1 1 1 1 -1 1 1
  [4,16,-1,0,1,1,0,1,1,1,1,-1,1,1],
// 4 16 -1 0 -1 -1 0 1 -1 1 1 -1 1 -1
  [4,16,-1,0,-1,-1,0,1,-1,1,1,-1,1,-1],
// 4 16 1 0 -1 -1 0 -1 -1 1 -1 1 1 -1
  [4,16,1,0,-1,-1,0,-1,-1,1,-1,1,1,-1],
// 4 16 1 0 1 1 0 -1 1 1 -1 1 1 1
  [4,16,1,0,1,1,0,-1,1,1,-1,1,1,1],
// 0
];
module ldraw_lib__box5_12(step=0, col=false, unit=2/5, alt=false, line=0.2, solid=!$preview)
    makepoly(ldraw_lib__box5_12(), step=step, col=col, unit=unit, alt=alt, line=line, solid=solid);
ldraw_lib__box5_12(line=0.2);
// file: 3004.scad
use <../lib.scad>
use <s/3004s01.scad>
function ldraw_lib__3004() = [
// 0 Brick  1 x  2
// 0 Name: 3004.dat
// 0 Author: James Jessiman
// 0 !LDRAW_ORG Part UPDATE 2022-05
// 0 !LICENSE Licensed under CC BY 2.0 and CC BY 4.0 : see CAreadme.txt
// 
// 0 BFC CERTIFY CCW
  [0,"BFC","CERTIFY"],
  [0,"BFC","CCW"],
// 
// 0 !HISTORY 2001-10-26 [PTadmin] Official Update 2001-01
// 0 !HISTORY 2002-05-07 {unknown} BFC Certification
// 0 !HISTORY 2002-06-11 [PTadmin] Official Update 2002-03
// 0 !HISTORY 2007-05-07 [PTadmin] Header formatted for Contributor Agreement
// 0 !HISTORY 2008-07-01 [PTadmin] Official Update 2008-01
// 0 !HISTORY 2022-08-04 [MagFors] Using subfile
// 0 !HISTORY 2022-09-15 [PTadmin] Official Update 2022-05
// 
// 
// 1 16 0 0 0 1 0 0 0 1 0 0 0 1 s\3004s01.dat
  [1,16,0,0,0,1,0,0,0,1,0,0,0,1, ldraw_lib__s__3004s01()],
// 4 16 -20 24 -10 20 24 -10 20 0 -10 -20 0 -10
  [4,16,-20,24,-10,20,24,-10,20,0,-10,-20,0,-10],
];
module ldraw_lib__3004(step=0, col=false, unit=2/5, alt=false, line=0.2, solid=!$preview)
    makepoly(ldraw_lib__3004(), step=step, col=col, unit=unit, alt=alt, line=line, solid=solid);
ldraw_lib__3004(line=0.2);
// file: 196945x.scad
use <../lib.scad>
use <../p/box5-12.scad>
use <../p/logo-shell-1971-outerbox.scad>
use <../p/logo-shell-1971.scad>
function ldraw_lib__196945x() = [
// 0 Sticker  1.0 x  1.3 with Shell Logo 1971 on Transparent Background
// 0 Name: 196945x.dat
// 0 Author: Vincent Messenet [Cheenzo]
// 0 !LDRAW_ORG Part UPDATE 2023-04
// 0 !LICENSE Licensed under CC BY 4.0 : see CAreadme.txt
// 
// 0 BFC CERTIFY CCW
  [0,"BFC","CERTIFY"],
  [0,"BFC","CCW"],
// 
// 0 !KEYWORDS Bricklink 7735stk01, Brickowl 938798, Rebrickable 196945, Set 7735
// 
// 0 !HISTORY 2023-08-25 [OrionP] Official Update 2023-04
// 
// 
// 1 16 0 -.25 0 13 0 0 0 .25 0 0 0 10 box5-12.dat
  [1,16,0,-.25,0,13,0,0,0,.25,0,0,0,10, ldraw_lib__box5_12()],
// 4 16 -7.36 -.25 -1.5296 -7.36 -.25 6.72 -13 -.25 10 -13 -.25 -10
  [4,16,-7.36,-.25,-1.5296,-7.36,-.25,6.72,-13,-.25,10,-13,-.25,-10],
// 3 16 -7.36 -.25 -1.5296 -13 -.25 -10 -7.36 -.25 -6.72
  [3,16,-7.36,-.25,-1.5296,-13,-.25,-10,-7.36,-.25,-6.72],
// 4 16 0 -.25 -6.72 -7.36 -.25 -6.72 -13 -.25 -10 13 -.25 -10
  [4,16,0,-.25,-6.72,-7.36,-.25,-6.72,-13,-.25,-10,13,-.25,-10],
// 3 16 7.36 -.25 -6.72 0 -.25 -6.72 13 -.25 -10
  [3,16,7.36,-.25,-6.72,0,-.25,-6.72,13,-.25,-10],
// 4 16 7.36 -.25 -1.5296 7.36 -.25 -6.72 13 -.25 -10 13 -.25 10
  [4,16,7.36,-.25,-1.5296,7.36,-.25,-6.72,13,-.25,-10,13,-.25,10],
// 3 16 13 -.25 10 7.36 -.25 6.72 7.36 -.25 -1.5296
  [3,16,13,-.25,10,7.36,-.25,6.72,7.36,-.25,-1.5296],
// 4 16 0 -.25 6.72 7.36 -.25 6.72 13 -.25 10 -13 -.25 10
  [4,16,0,-.25,6.72,7.36,-.25,6.72,13,-.25,10,-13,-.25,10],
// 3 16 -13 -.25 10 -7.36 -.25 6.72 0 -.25 6.72
  [3,16,-13,-.25,10,-7.36,-.25,6.72,0,-.25,6.72],
// 1 16 0 -.25 0 .64 0 0 0 1 0 0 0 .64 logo-shell-1971-outerbox.dat
  [1,16,0,-.25,0,.64,0,0,0,1,0,0,0,.64, ldraw_lib__logo_shell_1971_outerbox()],
// 0 BFC NOCLIP
  [0,"BFC","NOCLIP"],
// 1 16 0 -.25 0 .64 0 0 0 1 0 0 0 .64 logo-shell-1971.dat
  [1,16,0,-.25,0,.64,0,0,0,1,0,0,0,.64, ldraw_lib__logo_shell_1971()],
];
module ldraw_lib__196945x(step=0, col=false, unit=2/5, alt=false, line=0.2, solid=!$preview)
    makepoly(ldraw_lib__196945x(), step=step, col=col, unit=unit, alt=alt, line=line, solid=solid);
ldraw_lib__196945x(line=0.2);
// main file
use <../lib.scad>
use <196945x.scad>
use <3004.scad>
function ldraw_lib__3004d0r() = [
// 0 Brick  1 x  2 with Shell Logo 1971 on Transparent Background Sticker
// 0 Name: 3004d0r.dat
// 0 Author: Takeshi Takahashi [RainbowDolphin]
// 0 !LDRAW_ORG Shortcut UPDATE 2024-07
// 0 !LICENSE Licensed under CC BY 4.0 : see CAreadme.txt
// 
// 0 BFC CERTIFY CCW
  [0,"BFC","CERTIFY"],
  [0,"BFC","CCW"],
// 
// 0 !CATEGORY Sticker Shortcut
// 0 !KEYWORDS Bricklink 3004pb200, Set 7735, Train
// 
// 0 !HISTORY 2024-08-26 [OrionP] Official Update 2024-07
// 
// 1 16 0 0 0 1 0 0 0 1 0 0 0 1 3004.dat
  [1,16,0,0,0,1,0,0,0,1,0,0,0,1, ldraw_lib__3004()],
// 1 16 0 12 -10 1 0 0 0 0 -1 0 1 0 196945x.dat
  [1,16,0,12,-10,1,0,0,0,0,-1,0,1,0, ldraw_lib__196945x()],
];
module ldraw_lib__3004d0r(step=0, col=false, unit=2/5, alt=false, line=0.2, solid=!$preview)
    makepoly(ldraw_lib__3004d0r(), step=step, col=col, unit=unit, alt=alt, line=line, solid=solid);
ldraw_lib__3004d0r(line=0.2);
